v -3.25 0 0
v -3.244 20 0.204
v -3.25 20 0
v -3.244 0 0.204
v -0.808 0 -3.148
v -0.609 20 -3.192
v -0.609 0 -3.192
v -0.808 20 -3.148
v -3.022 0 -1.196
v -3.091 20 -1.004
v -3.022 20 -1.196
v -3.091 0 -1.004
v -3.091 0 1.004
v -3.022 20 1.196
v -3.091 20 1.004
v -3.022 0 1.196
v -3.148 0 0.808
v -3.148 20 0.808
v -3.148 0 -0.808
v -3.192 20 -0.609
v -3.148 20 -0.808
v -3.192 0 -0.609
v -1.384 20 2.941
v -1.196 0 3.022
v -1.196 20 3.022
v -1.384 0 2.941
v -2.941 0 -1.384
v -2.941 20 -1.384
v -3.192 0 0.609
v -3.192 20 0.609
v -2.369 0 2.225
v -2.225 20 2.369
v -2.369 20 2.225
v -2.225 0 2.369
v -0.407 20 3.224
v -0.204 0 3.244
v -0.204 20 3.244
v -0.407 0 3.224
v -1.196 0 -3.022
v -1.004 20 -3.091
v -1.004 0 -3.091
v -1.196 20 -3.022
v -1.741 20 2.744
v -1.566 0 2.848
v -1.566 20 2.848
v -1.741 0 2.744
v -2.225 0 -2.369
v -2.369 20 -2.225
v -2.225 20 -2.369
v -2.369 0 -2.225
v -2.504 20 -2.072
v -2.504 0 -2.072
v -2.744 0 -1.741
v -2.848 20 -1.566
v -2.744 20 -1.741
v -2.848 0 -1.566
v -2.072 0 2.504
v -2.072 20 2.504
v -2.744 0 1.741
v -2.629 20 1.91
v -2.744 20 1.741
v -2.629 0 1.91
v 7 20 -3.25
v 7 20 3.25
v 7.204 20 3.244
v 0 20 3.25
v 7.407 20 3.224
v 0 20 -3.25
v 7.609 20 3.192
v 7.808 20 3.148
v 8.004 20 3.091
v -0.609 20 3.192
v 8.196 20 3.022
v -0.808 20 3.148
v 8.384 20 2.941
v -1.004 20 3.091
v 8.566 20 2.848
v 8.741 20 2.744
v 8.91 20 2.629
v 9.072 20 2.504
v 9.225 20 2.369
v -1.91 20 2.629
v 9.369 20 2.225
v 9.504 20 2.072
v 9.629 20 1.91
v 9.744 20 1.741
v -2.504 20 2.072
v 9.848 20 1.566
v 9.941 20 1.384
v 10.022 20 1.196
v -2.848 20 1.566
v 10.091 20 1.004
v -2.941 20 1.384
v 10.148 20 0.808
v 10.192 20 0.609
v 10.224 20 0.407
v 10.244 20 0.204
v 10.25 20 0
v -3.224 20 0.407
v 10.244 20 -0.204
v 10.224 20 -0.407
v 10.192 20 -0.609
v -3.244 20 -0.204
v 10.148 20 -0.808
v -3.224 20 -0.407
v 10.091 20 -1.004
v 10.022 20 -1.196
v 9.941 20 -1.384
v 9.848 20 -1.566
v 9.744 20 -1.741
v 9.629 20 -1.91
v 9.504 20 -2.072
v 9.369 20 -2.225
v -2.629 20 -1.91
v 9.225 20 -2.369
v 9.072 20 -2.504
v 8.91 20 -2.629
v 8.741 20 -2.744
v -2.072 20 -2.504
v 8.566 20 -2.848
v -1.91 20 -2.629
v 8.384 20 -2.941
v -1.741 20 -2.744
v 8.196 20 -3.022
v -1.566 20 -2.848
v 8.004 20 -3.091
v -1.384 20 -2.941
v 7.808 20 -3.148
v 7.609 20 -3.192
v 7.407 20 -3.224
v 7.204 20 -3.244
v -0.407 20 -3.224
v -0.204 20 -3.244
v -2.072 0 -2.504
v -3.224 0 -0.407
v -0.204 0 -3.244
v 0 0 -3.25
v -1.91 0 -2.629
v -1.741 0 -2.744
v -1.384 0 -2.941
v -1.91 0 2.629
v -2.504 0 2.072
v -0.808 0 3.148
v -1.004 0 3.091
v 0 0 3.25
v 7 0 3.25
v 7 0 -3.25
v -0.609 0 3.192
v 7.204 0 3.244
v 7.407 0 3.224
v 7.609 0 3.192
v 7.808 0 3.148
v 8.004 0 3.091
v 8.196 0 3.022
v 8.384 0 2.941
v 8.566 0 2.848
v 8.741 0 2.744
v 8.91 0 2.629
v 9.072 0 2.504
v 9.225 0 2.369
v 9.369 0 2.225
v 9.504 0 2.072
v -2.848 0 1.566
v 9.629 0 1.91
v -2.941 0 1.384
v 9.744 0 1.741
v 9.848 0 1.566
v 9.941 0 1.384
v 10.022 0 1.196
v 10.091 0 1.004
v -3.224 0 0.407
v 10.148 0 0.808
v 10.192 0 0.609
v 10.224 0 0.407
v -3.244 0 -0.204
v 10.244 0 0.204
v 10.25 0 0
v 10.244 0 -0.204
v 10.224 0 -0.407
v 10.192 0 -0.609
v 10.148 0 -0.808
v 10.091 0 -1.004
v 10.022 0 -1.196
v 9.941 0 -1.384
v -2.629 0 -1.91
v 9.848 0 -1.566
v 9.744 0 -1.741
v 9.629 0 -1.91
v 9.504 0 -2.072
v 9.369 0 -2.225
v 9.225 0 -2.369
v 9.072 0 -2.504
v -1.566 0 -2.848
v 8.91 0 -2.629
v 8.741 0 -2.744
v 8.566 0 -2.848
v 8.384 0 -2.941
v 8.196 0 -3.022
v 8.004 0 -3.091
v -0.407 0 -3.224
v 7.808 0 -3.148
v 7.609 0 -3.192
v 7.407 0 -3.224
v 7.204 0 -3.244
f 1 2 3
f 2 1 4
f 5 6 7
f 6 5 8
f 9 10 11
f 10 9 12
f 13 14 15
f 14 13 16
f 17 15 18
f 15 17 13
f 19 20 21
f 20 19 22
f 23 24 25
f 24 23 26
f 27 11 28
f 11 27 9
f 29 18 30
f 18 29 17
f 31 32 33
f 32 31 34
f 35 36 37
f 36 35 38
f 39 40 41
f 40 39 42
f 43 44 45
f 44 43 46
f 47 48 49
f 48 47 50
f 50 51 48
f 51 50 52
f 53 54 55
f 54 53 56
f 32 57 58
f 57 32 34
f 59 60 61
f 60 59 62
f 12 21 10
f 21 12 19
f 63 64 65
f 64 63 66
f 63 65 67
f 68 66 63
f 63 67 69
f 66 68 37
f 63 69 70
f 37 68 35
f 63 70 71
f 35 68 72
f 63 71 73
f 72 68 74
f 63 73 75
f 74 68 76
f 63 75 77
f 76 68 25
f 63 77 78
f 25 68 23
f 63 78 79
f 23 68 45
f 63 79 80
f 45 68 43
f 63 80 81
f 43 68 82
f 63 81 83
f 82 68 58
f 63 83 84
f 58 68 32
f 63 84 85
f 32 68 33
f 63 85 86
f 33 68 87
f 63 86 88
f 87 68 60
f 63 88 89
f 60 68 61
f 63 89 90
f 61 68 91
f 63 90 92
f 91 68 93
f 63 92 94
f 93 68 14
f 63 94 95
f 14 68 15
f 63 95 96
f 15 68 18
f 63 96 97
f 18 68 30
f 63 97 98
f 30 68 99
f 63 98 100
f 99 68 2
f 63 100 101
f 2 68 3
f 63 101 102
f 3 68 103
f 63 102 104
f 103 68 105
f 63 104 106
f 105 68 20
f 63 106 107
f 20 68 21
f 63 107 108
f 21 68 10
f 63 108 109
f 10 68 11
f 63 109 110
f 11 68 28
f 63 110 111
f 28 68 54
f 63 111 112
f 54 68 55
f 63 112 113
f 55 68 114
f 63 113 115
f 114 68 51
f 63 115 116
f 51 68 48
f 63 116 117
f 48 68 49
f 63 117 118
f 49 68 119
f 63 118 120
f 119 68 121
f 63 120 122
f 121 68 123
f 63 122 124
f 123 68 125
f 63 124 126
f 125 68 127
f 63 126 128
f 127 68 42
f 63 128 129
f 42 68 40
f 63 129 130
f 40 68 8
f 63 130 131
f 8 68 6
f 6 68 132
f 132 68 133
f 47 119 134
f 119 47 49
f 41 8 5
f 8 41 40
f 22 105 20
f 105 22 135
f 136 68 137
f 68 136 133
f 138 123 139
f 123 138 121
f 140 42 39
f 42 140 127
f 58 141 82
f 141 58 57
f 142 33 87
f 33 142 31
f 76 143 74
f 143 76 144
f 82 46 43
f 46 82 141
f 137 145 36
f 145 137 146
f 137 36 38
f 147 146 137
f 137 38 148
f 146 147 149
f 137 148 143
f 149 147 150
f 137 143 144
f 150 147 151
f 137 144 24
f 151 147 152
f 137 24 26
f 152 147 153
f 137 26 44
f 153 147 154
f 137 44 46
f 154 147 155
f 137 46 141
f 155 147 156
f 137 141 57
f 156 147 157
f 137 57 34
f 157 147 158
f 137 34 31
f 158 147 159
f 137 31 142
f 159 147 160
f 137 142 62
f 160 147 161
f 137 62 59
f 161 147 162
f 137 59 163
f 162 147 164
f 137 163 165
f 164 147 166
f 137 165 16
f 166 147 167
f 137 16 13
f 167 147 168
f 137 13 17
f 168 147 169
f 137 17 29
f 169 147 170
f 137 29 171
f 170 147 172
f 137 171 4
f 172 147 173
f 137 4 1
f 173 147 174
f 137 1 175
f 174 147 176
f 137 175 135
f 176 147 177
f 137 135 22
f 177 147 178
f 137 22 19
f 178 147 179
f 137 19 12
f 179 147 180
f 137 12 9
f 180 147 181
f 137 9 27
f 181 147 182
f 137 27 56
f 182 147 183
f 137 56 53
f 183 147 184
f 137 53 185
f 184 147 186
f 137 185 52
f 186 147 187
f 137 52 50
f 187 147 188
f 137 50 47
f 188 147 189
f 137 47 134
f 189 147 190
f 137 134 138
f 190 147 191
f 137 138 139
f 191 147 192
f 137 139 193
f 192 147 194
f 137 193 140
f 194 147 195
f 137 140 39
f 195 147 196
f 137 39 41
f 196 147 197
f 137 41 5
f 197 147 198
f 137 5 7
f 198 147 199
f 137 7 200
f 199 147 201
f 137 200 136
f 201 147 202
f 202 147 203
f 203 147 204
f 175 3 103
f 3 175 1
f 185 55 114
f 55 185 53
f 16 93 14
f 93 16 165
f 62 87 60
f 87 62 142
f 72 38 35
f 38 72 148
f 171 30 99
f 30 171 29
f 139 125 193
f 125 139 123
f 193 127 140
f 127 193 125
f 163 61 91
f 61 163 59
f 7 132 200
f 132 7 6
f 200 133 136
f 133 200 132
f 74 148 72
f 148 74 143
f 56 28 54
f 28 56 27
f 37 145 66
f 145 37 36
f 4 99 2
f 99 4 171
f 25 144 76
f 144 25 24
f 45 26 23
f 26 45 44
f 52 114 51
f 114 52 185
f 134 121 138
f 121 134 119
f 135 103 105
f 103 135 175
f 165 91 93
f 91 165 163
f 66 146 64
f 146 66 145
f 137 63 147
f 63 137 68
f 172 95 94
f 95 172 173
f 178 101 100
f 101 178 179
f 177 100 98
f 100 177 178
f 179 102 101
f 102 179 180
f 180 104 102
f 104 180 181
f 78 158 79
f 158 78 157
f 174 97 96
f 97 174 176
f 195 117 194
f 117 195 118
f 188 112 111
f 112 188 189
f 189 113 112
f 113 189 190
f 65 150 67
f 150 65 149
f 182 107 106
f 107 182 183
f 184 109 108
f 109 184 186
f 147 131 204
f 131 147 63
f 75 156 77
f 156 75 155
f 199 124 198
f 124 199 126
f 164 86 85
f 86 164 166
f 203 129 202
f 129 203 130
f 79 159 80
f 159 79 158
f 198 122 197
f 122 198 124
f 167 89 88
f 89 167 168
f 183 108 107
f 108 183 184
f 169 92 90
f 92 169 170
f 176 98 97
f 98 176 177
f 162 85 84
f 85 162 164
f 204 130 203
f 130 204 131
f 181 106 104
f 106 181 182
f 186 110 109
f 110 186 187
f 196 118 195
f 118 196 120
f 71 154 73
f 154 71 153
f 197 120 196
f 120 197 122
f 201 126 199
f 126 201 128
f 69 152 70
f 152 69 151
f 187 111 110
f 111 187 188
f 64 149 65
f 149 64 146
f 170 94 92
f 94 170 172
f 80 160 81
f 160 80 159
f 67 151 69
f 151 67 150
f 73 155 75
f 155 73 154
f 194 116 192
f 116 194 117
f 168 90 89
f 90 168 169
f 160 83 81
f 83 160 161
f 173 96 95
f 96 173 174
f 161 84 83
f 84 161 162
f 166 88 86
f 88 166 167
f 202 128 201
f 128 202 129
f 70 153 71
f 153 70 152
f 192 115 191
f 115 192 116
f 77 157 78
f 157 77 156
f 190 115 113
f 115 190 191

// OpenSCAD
$fn=100;
module usbc_female() {
  // left half cylinder
  rotate([-90,0,0]) cylinder(h=20, r=3.25);

  translate([0,0,-3.25]) {
    cube([7,20,6.5]);
  }

  // right half cylinder
  translate([7,0,0]) {
    rotate([-90,0,0]) cylinder(h=20, r=3.25);
  }
}

usbc_female();
